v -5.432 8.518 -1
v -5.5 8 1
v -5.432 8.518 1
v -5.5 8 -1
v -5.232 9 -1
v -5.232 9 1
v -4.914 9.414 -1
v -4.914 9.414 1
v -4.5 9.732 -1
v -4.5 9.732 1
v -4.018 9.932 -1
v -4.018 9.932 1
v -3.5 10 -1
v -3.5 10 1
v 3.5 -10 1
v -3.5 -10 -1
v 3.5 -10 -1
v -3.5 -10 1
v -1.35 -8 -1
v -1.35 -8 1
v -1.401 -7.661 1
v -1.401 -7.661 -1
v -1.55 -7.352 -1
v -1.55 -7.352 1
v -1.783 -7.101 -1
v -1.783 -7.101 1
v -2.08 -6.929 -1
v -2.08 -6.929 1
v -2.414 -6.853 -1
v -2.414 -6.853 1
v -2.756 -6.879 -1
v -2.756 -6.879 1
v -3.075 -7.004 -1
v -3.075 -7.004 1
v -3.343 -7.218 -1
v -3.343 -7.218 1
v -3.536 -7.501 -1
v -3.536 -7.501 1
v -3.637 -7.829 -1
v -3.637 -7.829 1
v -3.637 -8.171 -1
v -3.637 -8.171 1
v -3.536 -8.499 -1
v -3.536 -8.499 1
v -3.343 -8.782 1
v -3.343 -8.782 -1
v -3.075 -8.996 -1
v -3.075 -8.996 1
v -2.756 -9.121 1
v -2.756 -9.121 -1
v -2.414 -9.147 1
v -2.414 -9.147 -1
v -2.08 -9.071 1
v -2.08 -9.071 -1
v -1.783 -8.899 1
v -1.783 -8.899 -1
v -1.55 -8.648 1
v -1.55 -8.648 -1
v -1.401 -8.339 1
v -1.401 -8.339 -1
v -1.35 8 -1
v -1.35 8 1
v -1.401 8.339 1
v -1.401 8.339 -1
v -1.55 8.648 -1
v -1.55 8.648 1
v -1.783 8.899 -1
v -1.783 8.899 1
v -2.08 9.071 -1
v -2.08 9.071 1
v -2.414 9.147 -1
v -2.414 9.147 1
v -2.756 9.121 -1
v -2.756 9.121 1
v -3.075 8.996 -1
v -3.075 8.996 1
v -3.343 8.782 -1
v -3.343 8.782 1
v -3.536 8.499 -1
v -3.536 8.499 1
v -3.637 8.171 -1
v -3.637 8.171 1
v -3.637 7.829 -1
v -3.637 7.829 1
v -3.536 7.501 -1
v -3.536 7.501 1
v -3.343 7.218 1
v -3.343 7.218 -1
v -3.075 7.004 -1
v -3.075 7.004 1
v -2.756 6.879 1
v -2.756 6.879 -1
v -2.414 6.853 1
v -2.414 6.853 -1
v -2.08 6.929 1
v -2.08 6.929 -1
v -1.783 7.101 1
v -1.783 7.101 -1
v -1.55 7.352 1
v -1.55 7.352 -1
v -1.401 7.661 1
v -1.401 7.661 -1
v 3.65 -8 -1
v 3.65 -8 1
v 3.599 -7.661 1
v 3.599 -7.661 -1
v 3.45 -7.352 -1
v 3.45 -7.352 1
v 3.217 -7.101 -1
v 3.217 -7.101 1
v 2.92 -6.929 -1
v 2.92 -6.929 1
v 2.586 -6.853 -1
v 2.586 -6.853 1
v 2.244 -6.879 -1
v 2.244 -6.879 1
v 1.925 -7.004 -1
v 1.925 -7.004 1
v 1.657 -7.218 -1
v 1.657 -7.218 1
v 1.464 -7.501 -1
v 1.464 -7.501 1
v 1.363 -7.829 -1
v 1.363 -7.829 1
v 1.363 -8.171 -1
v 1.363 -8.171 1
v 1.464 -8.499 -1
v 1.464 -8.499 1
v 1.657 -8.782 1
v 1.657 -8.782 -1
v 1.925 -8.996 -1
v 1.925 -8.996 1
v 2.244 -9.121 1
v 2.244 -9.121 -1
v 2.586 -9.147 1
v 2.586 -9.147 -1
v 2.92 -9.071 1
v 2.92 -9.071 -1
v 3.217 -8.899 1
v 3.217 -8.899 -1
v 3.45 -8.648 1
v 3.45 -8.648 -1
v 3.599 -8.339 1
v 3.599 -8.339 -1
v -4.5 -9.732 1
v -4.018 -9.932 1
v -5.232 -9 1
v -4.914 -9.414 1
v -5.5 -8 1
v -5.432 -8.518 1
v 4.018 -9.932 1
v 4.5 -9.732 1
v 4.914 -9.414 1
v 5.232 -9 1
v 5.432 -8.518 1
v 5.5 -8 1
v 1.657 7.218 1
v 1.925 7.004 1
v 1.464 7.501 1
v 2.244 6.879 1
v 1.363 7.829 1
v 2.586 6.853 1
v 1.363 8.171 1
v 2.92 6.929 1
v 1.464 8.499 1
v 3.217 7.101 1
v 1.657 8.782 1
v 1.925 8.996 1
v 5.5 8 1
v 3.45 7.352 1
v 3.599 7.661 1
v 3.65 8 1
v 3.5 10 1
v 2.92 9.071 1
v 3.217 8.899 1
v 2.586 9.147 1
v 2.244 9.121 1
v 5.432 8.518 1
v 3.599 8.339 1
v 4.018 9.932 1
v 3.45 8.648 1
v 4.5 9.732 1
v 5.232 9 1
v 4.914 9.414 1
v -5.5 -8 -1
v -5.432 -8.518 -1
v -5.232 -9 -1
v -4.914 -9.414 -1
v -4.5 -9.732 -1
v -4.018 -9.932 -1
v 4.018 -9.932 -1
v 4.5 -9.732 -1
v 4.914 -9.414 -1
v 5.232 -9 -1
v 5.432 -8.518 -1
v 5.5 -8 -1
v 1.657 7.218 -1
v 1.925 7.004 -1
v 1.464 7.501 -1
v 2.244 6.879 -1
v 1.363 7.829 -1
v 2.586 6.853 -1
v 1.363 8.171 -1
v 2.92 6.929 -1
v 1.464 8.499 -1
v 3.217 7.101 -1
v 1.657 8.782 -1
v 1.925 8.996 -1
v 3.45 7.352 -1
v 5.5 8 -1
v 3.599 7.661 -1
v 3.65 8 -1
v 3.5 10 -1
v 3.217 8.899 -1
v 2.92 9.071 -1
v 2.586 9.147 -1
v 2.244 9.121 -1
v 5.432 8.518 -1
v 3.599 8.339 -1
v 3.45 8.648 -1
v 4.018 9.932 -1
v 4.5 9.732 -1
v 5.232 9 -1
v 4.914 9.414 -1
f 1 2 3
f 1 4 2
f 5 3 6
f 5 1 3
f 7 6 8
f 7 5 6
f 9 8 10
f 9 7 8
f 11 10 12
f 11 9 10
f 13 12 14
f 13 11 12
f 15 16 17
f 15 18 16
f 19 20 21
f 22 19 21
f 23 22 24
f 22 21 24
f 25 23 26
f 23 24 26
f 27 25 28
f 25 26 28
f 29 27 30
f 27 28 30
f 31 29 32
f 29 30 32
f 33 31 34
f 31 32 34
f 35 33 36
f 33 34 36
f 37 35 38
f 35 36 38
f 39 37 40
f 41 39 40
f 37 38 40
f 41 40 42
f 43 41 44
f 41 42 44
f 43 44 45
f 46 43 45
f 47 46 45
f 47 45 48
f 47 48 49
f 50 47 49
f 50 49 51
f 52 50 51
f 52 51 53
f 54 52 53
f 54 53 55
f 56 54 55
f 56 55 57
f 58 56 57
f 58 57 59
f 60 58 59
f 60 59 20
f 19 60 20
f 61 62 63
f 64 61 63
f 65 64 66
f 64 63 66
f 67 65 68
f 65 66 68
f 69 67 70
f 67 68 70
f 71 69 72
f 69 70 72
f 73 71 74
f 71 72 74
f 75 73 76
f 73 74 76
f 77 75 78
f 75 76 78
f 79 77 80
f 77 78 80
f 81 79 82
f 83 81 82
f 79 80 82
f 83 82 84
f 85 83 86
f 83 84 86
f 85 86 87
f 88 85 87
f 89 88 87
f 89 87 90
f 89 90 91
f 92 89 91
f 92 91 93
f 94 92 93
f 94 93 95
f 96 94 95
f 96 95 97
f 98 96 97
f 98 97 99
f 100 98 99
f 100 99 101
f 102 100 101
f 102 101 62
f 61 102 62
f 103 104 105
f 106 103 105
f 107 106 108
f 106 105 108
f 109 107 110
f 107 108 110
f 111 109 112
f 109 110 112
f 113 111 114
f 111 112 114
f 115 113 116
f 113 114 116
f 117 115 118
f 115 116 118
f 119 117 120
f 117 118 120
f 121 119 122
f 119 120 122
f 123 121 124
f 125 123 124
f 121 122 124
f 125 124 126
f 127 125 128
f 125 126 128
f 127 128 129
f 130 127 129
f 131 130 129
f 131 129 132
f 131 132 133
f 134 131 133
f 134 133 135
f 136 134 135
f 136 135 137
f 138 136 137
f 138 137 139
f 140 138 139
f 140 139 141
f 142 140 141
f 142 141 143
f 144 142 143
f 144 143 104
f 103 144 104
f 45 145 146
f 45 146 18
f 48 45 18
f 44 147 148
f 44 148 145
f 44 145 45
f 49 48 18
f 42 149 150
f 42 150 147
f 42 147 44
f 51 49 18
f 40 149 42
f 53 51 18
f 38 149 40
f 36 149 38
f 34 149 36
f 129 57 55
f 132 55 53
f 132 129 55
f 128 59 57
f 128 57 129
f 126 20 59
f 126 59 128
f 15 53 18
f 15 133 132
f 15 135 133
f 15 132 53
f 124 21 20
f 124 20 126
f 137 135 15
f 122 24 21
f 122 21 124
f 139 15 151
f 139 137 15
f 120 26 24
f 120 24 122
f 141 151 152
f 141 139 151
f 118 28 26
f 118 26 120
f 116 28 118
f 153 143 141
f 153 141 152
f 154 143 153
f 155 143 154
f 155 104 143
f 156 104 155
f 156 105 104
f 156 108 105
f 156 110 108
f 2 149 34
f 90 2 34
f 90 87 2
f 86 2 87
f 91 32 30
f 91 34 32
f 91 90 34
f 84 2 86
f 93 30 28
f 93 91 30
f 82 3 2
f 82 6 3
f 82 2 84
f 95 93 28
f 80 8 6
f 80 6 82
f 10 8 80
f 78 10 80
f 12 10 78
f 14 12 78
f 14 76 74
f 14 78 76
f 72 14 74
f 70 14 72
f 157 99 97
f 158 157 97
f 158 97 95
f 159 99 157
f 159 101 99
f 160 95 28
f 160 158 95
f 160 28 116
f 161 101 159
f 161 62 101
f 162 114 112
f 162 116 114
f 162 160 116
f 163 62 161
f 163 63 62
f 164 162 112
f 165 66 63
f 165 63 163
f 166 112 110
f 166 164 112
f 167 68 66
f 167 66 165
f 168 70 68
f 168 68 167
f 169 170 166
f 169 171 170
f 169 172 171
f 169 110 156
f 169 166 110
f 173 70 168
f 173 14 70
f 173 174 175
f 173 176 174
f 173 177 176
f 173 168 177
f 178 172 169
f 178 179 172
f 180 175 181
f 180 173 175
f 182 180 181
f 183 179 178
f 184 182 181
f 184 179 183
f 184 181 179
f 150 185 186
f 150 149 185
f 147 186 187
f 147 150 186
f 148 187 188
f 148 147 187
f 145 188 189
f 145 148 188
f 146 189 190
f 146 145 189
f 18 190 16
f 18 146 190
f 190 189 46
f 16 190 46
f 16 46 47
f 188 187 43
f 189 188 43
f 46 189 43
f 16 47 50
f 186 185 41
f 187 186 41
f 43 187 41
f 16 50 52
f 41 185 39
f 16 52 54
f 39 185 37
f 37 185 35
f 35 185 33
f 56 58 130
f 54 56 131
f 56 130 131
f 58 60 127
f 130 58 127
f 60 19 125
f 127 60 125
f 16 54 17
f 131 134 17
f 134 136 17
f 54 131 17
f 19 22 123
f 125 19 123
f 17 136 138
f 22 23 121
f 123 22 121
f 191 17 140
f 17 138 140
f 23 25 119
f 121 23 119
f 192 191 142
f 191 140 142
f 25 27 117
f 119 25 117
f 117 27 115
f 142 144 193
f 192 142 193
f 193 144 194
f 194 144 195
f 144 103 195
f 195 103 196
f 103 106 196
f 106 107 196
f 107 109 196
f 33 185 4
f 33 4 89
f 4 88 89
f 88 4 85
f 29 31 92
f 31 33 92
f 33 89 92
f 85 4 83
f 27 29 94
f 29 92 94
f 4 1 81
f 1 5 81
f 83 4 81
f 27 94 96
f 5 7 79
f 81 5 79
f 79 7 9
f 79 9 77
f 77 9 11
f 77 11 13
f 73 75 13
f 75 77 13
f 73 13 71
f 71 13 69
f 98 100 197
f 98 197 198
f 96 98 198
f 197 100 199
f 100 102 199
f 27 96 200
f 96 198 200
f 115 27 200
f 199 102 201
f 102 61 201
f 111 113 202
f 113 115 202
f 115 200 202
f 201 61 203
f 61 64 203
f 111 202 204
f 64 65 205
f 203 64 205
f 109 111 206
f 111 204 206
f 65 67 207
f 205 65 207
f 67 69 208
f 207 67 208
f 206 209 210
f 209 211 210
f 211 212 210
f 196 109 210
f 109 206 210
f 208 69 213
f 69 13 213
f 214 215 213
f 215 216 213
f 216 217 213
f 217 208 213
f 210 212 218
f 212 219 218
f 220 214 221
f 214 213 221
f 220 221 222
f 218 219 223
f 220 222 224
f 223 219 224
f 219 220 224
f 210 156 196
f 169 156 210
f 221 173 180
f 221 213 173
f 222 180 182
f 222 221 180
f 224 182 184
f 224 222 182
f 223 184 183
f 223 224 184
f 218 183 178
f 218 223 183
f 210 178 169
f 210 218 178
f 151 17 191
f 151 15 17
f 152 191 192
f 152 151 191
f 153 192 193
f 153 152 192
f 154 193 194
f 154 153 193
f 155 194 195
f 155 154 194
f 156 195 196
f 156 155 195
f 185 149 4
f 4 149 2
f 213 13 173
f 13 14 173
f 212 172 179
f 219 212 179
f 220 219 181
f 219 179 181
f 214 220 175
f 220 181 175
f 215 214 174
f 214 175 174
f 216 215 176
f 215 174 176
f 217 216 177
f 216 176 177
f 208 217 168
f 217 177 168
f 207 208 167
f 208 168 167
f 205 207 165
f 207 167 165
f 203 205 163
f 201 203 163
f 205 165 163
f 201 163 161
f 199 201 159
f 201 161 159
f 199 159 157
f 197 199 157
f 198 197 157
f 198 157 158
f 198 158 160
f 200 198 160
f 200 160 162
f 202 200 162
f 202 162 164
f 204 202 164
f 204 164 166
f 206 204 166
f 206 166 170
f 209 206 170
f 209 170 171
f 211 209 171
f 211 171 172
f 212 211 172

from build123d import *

# Parameters (mm, degrees)
SKETCH_1_W          = 11
SKETCH_1_H          = 20
EXTRUDE_1_DEPTH     = 1
SKETCH_2_R          = 1.15
CUT_EXTRUDE_1_DEPTH = 12.586630226
FILLET_1_R          = 2


with BuildPart() as part:
    # 草图1 → 凸台-拉伸1 (new, symmetric)
    with BuildSketch(Plane.XY):
        Rectangle(SKETCH_1_W, SKETCH_1_H)
    extrude(amount=EXTRUDE_1_DEPTH, both=True)

    # 草图2 → 切除-拉伸1 (cut, through all)
    with BuildSketch(Plane.XY.offset(1)):
        with Locations((-2.5, 8)):
            Circle(SKETCH_2_R)
        with Locations((2.5, 8)):
            Circle(SKETCH_2_R)
        with Locations((-2.5, -8)):
            Circle(SKETCH_2_R)
        with Locations((2.5, -8)):
            Circle(SKETCH_2_R)
    extrude(amount=-CUT_EXTRUDE_1_DEPTH, mode=Mode.SUBTRACT)

    # 圆角1
    fillet_1_edges = [part.edges().sort_by_distance(p)[0] for p in [
        (5.5, -10, 0),
        (-5.5, -10, 0),
        (-5.5, 10, 0),
        (5.5, 10, 0),
    ]]
    fillet(fillet_1_edges, radius=FILLET_1_R)


solid = part.part
